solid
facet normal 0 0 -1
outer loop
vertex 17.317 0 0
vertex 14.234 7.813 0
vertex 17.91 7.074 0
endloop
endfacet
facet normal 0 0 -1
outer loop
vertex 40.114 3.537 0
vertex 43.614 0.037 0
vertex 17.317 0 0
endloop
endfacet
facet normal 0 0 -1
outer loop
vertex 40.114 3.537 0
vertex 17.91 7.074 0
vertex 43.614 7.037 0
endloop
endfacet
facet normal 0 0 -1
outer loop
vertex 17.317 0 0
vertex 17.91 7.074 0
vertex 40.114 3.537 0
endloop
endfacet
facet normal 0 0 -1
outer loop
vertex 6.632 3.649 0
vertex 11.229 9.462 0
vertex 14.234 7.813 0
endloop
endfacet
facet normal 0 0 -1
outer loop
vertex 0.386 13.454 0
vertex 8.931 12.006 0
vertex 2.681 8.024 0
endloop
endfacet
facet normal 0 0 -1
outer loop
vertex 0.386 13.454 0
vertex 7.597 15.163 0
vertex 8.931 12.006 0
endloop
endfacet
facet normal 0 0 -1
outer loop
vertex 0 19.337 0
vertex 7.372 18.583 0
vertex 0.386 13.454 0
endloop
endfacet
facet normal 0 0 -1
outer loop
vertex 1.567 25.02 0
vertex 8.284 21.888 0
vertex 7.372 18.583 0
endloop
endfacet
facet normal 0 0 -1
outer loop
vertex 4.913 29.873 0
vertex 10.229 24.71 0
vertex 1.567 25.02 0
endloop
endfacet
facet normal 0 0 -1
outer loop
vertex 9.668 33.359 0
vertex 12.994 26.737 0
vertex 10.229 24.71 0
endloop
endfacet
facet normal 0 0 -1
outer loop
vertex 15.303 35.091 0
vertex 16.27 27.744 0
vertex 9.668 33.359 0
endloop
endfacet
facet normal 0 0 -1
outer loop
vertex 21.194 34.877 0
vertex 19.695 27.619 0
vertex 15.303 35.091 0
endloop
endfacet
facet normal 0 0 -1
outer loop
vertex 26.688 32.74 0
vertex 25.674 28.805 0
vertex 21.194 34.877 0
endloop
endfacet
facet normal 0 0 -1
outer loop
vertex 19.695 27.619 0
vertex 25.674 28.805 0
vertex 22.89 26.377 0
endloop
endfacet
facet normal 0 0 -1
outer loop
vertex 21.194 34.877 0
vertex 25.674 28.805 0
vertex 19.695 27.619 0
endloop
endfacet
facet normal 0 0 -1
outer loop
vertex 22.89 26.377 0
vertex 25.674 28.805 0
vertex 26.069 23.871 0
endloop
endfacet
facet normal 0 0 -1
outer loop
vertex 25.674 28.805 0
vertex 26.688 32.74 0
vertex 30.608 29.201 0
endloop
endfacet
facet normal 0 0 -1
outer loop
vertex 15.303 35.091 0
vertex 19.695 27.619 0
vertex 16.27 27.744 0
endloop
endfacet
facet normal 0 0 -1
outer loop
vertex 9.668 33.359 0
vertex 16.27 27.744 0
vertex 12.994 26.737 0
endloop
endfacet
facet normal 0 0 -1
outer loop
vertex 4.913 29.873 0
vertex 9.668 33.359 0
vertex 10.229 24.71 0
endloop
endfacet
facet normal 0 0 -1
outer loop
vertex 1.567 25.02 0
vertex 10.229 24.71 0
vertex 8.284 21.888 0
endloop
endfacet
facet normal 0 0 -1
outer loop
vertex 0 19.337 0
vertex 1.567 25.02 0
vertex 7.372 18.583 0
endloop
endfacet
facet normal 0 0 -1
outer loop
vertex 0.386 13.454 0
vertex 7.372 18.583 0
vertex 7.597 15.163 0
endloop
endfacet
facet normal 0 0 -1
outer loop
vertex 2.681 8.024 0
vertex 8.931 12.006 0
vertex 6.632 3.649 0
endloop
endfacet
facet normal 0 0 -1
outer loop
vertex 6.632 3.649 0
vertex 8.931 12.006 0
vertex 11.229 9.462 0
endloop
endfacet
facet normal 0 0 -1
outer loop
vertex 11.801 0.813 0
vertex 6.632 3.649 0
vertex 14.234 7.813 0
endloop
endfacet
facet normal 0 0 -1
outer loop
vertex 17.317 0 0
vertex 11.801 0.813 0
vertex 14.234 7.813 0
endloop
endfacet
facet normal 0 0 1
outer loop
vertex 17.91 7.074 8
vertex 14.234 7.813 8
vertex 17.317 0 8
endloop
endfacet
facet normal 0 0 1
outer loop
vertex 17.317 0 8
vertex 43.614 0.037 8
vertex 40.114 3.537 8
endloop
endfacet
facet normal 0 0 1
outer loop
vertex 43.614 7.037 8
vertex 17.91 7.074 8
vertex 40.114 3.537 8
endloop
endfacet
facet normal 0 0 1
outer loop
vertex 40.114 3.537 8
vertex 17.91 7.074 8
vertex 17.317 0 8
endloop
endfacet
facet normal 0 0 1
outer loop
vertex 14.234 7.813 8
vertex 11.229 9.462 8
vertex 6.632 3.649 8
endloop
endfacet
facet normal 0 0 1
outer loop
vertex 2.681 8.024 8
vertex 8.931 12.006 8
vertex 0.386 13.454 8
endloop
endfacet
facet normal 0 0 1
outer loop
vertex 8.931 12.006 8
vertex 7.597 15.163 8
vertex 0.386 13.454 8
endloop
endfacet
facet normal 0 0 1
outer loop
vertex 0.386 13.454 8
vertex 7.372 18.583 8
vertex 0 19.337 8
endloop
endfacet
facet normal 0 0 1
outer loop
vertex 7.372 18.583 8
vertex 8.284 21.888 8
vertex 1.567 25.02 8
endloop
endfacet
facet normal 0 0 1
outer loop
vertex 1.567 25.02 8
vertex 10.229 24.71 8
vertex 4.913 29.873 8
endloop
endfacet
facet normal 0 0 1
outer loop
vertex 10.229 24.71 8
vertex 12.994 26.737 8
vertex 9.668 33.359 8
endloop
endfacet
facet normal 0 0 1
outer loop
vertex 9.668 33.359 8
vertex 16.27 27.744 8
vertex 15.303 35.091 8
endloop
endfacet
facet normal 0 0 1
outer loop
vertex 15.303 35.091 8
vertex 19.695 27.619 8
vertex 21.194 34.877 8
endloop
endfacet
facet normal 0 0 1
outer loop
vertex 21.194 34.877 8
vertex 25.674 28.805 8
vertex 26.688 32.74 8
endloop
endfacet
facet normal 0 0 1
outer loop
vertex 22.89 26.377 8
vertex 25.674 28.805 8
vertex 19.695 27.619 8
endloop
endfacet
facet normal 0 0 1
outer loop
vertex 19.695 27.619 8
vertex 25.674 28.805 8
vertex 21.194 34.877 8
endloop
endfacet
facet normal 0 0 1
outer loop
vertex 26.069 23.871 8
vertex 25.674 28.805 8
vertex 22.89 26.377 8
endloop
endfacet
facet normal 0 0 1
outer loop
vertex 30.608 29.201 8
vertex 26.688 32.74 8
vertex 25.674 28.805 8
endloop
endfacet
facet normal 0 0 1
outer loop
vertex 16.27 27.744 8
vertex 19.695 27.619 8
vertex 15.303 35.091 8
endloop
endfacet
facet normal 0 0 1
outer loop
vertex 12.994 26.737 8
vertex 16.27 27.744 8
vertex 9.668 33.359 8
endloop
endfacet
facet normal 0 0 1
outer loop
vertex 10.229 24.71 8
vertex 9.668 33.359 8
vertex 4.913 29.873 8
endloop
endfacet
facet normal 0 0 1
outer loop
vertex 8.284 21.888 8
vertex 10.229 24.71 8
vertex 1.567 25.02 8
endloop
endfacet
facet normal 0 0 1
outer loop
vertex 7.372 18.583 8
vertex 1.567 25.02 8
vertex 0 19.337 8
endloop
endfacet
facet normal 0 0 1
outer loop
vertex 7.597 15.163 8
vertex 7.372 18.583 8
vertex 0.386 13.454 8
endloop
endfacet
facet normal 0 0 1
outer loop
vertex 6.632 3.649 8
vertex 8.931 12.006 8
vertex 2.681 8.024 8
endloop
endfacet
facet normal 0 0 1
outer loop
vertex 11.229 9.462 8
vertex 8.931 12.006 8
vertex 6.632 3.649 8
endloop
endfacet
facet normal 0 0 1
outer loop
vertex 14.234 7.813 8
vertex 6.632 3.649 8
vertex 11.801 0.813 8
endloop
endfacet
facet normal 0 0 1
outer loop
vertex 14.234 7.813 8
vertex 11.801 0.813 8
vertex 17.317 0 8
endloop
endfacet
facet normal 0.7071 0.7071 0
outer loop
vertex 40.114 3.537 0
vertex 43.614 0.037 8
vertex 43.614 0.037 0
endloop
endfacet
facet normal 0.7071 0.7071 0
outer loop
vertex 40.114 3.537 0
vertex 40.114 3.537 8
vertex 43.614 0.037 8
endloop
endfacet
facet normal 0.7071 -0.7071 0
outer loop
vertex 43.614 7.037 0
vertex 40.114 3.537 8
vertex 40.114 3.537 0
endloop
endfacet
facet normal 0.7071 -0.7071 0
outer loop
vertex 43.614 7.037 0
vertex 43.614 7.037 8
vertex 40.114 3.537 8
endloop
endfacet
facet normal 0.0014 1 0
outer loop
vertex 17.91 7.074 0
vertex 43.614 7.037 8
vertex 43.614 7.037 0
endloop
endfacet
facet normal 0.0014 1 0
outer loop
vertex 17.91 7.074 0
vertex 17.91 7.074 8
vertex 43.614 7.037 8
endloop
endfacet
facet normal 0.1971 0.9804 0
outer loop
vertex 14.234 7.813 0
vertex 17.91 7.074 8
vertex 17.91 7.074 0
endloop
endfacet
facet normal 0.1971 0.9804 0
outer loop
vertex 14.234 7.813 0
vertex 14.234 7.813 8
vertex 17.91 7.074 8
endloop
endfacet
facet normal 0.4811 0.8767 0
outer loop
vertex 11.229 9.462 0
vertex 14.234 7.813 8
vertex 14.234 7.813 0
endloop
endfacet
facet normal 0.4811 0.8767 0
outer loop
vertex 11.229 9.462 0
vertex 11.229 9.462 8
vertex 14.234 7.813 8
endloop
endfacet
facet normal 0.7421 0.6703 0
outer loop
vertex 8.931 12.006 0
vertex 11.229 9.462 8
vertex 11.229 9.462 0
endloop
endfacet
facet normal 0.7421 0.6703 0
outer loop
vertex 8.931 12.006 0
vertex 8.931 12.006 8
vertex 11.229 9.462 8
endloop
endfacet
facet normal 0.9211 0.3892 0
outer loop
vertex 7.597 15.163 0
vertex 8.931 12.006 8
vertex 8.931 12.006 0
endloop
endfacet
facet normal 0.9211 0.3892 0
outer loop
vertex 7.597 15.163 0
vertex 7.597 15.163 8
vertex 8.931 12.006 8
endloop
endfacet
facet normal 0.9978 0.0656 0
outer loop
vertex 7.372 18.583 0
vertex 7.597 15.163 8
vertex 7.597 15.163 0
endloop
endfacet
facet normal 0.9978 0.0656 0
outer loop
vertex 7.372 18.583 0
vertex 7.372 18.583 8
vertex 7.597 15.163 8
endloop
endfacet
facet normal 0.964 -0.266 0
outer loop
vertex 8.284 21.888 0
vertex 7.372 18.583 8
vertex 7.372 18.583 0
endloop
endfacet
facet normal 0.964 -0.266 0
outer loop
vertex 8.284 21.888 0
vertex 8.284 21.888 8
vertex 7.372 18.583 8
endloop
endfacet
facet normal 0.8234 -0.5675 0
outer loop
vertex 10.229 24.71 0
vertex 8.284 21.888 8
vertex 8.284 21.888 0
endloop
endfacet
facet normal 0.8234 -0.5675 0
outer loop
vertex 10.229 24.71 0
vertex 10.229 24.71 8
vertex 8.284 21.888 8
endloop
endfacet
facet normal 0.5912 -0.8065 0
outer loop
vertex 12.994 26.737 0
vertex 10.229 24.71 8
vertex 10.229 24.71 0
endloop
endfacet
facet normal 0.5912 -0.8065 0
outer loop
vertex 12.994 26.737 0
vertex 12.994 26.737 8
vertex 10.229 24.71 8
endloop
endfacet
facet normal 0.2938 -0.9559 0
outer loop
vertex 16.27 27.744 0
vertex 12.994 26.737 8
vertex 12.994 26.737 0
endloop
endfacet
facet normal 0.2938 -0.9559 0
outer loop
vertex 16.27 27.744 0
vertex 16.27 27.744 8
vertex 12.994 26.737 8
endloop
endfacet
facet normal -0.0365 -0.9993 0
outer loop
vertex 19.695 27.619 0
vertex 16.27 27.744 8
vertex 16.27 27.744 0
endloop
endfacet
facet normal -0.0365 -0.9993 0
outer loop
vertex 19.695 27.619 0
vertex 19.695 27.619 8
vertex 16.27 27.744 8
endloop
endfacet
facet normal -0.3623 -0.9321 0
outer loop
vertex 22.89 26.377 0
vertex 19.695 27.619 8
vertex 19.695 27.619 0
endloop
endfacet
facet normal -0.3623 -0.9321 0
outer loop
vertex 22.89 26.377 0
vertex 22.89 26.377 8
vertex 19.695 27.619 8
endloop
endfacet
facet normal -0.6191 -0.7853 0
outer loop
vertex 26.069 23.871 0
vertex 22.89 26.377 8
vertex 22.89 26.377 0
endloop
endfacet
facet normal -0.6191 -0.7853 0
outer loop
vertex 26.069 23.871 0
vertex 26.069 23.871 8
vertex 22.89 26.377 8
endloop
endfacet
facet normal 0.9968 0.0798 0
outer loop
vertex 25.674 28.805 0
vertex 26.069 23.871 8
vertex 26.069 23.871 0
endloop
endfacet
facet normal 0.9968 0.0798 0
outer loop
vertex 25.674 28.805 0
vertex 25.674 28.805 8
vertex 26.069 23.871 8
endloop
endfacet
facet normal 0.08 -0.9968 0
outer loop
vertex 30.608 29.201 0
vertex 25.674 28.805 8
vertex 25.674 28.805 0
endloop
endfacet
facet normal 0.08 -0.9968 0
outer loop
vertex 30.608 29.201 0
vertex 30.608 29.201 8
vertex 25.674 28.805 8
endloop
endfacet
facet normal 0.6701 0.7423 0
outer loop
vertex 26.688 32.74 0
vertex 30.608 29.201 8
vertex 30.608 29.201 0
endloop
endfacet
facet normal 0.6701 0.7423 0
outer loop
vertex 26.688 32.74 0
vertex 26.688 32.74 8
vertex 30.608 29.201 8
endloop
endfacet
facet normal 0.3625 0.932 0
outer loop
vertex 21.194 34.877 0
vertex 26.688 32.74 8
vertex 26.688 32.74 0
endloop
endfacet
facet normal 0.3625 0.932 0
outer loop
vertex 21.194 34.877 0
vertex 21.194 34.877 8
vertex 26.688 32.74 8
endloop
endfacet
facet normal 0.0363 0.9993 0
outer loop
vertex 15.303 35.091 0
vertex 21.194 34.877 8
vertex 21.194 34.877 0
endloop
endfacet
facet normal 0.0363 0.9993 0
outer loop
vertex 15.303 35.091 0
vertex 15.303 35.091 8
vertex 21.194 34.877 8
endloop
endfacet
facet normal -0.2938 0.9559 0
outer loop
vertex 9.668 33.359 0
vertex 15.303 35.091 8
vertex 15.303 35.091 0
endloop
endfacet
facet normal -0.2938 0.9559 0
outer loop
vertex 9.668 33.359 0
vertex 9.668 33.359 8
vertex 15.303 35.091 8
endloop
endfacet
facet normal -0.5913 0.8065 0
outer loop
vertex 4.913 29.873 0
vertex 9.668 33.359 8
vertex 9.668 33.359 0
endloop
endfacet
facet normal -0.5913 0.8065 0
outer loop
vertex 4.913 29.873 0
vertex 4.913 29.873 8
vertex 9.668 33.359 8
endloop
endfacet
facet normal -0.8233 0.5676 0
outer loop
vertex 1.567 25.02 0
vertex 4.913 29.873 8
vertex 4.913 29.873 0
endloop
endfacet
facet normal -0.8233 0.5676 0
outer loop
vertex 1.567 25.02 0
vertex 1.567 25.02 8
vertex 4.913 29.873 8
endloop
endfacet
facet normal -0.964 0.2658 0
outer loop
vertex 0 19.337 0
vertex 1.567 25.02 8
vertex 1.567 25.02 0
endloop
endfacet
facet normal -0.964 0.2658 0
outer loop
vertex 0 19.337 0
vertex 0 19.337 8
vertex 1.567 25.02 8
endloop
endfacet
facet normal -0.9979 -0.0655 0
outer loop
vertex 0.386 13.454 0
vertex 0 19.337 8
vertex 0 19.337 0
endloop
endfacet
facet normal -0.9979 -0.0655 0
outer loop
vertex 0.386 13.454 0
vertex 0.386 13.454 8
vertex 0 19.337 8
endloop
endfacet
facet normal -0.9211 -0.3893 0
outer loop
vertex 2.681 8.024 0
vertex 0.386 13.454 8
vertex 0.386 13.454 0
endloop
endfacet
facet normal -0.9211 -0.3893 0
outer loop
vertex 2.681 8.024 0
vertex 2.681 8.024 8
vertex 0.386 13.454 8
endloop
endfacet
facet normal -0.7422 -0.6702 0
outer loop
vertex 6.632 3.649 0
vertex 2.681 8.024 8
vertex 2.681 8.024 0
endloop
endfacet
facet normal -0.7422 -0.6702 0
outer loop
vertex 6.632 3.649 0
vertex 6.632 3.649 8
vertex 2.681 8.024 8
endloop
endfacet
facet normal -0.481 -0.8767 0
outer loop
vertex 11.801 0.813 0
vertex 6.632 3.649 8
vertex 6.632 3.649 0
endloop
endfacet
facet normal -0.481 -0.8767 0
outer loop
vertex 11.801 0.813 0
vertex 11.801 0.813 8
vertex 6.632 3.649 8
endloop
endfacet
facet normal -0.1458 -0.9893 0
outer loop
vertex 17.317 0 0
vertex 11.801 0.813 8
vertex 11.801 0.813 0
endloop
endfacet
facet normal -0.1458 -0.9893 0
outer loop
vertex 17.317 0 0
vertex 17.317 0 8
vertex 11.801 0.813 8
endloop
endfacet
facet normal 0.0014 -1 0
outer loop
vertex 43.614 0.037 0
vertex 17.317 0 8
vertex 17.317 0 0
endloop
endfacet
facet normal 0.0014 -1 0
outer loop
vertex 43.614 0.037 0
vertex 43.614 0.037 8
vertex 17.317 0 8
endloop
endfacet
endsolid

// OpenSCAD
$fn = 32;

// ----------------------------------------------------------------------
// Eye lug: ring_tail, 8 mm thick
// ----------------------------------------------------------------------

// --- parameters (mm) ---
profile_height = 8;       // extrusion height
profile_points = 30;      // points of the closed outline

profile = [[25.674, 28.805], [30.608, 29.201], [26.688, 32.74], [21.194, 34.877], [15.303, 35.091], [9.668, 33.359], [4.913, 29.873], [1.567, 25.02], [0, 19.337], [0.386, 13.454], [2.681, 8.024], [6.632, 3.649], [11.801, 0.813], [17.317, 0], [43.614, 0.037], [40.114, 3.537], [43.614, 7.037], [17.91, 7.074], [14.234, 7.813], [11.229, 9.462], [8.931, 12.006], [7.597, 15.163], [7.372, 18.583], [8.284, 21.888], [10.229, 24.71], [12.994, 26.737], [16.27, 27.744], [19.695, 27.619], [22.89, 26.377], [26.069, 23.871]];  // single closed polygon, 30 points, counter clockwise

// --- the one profile operation ---
linear_extrude(height = profile_height) polygon(points = profile);
